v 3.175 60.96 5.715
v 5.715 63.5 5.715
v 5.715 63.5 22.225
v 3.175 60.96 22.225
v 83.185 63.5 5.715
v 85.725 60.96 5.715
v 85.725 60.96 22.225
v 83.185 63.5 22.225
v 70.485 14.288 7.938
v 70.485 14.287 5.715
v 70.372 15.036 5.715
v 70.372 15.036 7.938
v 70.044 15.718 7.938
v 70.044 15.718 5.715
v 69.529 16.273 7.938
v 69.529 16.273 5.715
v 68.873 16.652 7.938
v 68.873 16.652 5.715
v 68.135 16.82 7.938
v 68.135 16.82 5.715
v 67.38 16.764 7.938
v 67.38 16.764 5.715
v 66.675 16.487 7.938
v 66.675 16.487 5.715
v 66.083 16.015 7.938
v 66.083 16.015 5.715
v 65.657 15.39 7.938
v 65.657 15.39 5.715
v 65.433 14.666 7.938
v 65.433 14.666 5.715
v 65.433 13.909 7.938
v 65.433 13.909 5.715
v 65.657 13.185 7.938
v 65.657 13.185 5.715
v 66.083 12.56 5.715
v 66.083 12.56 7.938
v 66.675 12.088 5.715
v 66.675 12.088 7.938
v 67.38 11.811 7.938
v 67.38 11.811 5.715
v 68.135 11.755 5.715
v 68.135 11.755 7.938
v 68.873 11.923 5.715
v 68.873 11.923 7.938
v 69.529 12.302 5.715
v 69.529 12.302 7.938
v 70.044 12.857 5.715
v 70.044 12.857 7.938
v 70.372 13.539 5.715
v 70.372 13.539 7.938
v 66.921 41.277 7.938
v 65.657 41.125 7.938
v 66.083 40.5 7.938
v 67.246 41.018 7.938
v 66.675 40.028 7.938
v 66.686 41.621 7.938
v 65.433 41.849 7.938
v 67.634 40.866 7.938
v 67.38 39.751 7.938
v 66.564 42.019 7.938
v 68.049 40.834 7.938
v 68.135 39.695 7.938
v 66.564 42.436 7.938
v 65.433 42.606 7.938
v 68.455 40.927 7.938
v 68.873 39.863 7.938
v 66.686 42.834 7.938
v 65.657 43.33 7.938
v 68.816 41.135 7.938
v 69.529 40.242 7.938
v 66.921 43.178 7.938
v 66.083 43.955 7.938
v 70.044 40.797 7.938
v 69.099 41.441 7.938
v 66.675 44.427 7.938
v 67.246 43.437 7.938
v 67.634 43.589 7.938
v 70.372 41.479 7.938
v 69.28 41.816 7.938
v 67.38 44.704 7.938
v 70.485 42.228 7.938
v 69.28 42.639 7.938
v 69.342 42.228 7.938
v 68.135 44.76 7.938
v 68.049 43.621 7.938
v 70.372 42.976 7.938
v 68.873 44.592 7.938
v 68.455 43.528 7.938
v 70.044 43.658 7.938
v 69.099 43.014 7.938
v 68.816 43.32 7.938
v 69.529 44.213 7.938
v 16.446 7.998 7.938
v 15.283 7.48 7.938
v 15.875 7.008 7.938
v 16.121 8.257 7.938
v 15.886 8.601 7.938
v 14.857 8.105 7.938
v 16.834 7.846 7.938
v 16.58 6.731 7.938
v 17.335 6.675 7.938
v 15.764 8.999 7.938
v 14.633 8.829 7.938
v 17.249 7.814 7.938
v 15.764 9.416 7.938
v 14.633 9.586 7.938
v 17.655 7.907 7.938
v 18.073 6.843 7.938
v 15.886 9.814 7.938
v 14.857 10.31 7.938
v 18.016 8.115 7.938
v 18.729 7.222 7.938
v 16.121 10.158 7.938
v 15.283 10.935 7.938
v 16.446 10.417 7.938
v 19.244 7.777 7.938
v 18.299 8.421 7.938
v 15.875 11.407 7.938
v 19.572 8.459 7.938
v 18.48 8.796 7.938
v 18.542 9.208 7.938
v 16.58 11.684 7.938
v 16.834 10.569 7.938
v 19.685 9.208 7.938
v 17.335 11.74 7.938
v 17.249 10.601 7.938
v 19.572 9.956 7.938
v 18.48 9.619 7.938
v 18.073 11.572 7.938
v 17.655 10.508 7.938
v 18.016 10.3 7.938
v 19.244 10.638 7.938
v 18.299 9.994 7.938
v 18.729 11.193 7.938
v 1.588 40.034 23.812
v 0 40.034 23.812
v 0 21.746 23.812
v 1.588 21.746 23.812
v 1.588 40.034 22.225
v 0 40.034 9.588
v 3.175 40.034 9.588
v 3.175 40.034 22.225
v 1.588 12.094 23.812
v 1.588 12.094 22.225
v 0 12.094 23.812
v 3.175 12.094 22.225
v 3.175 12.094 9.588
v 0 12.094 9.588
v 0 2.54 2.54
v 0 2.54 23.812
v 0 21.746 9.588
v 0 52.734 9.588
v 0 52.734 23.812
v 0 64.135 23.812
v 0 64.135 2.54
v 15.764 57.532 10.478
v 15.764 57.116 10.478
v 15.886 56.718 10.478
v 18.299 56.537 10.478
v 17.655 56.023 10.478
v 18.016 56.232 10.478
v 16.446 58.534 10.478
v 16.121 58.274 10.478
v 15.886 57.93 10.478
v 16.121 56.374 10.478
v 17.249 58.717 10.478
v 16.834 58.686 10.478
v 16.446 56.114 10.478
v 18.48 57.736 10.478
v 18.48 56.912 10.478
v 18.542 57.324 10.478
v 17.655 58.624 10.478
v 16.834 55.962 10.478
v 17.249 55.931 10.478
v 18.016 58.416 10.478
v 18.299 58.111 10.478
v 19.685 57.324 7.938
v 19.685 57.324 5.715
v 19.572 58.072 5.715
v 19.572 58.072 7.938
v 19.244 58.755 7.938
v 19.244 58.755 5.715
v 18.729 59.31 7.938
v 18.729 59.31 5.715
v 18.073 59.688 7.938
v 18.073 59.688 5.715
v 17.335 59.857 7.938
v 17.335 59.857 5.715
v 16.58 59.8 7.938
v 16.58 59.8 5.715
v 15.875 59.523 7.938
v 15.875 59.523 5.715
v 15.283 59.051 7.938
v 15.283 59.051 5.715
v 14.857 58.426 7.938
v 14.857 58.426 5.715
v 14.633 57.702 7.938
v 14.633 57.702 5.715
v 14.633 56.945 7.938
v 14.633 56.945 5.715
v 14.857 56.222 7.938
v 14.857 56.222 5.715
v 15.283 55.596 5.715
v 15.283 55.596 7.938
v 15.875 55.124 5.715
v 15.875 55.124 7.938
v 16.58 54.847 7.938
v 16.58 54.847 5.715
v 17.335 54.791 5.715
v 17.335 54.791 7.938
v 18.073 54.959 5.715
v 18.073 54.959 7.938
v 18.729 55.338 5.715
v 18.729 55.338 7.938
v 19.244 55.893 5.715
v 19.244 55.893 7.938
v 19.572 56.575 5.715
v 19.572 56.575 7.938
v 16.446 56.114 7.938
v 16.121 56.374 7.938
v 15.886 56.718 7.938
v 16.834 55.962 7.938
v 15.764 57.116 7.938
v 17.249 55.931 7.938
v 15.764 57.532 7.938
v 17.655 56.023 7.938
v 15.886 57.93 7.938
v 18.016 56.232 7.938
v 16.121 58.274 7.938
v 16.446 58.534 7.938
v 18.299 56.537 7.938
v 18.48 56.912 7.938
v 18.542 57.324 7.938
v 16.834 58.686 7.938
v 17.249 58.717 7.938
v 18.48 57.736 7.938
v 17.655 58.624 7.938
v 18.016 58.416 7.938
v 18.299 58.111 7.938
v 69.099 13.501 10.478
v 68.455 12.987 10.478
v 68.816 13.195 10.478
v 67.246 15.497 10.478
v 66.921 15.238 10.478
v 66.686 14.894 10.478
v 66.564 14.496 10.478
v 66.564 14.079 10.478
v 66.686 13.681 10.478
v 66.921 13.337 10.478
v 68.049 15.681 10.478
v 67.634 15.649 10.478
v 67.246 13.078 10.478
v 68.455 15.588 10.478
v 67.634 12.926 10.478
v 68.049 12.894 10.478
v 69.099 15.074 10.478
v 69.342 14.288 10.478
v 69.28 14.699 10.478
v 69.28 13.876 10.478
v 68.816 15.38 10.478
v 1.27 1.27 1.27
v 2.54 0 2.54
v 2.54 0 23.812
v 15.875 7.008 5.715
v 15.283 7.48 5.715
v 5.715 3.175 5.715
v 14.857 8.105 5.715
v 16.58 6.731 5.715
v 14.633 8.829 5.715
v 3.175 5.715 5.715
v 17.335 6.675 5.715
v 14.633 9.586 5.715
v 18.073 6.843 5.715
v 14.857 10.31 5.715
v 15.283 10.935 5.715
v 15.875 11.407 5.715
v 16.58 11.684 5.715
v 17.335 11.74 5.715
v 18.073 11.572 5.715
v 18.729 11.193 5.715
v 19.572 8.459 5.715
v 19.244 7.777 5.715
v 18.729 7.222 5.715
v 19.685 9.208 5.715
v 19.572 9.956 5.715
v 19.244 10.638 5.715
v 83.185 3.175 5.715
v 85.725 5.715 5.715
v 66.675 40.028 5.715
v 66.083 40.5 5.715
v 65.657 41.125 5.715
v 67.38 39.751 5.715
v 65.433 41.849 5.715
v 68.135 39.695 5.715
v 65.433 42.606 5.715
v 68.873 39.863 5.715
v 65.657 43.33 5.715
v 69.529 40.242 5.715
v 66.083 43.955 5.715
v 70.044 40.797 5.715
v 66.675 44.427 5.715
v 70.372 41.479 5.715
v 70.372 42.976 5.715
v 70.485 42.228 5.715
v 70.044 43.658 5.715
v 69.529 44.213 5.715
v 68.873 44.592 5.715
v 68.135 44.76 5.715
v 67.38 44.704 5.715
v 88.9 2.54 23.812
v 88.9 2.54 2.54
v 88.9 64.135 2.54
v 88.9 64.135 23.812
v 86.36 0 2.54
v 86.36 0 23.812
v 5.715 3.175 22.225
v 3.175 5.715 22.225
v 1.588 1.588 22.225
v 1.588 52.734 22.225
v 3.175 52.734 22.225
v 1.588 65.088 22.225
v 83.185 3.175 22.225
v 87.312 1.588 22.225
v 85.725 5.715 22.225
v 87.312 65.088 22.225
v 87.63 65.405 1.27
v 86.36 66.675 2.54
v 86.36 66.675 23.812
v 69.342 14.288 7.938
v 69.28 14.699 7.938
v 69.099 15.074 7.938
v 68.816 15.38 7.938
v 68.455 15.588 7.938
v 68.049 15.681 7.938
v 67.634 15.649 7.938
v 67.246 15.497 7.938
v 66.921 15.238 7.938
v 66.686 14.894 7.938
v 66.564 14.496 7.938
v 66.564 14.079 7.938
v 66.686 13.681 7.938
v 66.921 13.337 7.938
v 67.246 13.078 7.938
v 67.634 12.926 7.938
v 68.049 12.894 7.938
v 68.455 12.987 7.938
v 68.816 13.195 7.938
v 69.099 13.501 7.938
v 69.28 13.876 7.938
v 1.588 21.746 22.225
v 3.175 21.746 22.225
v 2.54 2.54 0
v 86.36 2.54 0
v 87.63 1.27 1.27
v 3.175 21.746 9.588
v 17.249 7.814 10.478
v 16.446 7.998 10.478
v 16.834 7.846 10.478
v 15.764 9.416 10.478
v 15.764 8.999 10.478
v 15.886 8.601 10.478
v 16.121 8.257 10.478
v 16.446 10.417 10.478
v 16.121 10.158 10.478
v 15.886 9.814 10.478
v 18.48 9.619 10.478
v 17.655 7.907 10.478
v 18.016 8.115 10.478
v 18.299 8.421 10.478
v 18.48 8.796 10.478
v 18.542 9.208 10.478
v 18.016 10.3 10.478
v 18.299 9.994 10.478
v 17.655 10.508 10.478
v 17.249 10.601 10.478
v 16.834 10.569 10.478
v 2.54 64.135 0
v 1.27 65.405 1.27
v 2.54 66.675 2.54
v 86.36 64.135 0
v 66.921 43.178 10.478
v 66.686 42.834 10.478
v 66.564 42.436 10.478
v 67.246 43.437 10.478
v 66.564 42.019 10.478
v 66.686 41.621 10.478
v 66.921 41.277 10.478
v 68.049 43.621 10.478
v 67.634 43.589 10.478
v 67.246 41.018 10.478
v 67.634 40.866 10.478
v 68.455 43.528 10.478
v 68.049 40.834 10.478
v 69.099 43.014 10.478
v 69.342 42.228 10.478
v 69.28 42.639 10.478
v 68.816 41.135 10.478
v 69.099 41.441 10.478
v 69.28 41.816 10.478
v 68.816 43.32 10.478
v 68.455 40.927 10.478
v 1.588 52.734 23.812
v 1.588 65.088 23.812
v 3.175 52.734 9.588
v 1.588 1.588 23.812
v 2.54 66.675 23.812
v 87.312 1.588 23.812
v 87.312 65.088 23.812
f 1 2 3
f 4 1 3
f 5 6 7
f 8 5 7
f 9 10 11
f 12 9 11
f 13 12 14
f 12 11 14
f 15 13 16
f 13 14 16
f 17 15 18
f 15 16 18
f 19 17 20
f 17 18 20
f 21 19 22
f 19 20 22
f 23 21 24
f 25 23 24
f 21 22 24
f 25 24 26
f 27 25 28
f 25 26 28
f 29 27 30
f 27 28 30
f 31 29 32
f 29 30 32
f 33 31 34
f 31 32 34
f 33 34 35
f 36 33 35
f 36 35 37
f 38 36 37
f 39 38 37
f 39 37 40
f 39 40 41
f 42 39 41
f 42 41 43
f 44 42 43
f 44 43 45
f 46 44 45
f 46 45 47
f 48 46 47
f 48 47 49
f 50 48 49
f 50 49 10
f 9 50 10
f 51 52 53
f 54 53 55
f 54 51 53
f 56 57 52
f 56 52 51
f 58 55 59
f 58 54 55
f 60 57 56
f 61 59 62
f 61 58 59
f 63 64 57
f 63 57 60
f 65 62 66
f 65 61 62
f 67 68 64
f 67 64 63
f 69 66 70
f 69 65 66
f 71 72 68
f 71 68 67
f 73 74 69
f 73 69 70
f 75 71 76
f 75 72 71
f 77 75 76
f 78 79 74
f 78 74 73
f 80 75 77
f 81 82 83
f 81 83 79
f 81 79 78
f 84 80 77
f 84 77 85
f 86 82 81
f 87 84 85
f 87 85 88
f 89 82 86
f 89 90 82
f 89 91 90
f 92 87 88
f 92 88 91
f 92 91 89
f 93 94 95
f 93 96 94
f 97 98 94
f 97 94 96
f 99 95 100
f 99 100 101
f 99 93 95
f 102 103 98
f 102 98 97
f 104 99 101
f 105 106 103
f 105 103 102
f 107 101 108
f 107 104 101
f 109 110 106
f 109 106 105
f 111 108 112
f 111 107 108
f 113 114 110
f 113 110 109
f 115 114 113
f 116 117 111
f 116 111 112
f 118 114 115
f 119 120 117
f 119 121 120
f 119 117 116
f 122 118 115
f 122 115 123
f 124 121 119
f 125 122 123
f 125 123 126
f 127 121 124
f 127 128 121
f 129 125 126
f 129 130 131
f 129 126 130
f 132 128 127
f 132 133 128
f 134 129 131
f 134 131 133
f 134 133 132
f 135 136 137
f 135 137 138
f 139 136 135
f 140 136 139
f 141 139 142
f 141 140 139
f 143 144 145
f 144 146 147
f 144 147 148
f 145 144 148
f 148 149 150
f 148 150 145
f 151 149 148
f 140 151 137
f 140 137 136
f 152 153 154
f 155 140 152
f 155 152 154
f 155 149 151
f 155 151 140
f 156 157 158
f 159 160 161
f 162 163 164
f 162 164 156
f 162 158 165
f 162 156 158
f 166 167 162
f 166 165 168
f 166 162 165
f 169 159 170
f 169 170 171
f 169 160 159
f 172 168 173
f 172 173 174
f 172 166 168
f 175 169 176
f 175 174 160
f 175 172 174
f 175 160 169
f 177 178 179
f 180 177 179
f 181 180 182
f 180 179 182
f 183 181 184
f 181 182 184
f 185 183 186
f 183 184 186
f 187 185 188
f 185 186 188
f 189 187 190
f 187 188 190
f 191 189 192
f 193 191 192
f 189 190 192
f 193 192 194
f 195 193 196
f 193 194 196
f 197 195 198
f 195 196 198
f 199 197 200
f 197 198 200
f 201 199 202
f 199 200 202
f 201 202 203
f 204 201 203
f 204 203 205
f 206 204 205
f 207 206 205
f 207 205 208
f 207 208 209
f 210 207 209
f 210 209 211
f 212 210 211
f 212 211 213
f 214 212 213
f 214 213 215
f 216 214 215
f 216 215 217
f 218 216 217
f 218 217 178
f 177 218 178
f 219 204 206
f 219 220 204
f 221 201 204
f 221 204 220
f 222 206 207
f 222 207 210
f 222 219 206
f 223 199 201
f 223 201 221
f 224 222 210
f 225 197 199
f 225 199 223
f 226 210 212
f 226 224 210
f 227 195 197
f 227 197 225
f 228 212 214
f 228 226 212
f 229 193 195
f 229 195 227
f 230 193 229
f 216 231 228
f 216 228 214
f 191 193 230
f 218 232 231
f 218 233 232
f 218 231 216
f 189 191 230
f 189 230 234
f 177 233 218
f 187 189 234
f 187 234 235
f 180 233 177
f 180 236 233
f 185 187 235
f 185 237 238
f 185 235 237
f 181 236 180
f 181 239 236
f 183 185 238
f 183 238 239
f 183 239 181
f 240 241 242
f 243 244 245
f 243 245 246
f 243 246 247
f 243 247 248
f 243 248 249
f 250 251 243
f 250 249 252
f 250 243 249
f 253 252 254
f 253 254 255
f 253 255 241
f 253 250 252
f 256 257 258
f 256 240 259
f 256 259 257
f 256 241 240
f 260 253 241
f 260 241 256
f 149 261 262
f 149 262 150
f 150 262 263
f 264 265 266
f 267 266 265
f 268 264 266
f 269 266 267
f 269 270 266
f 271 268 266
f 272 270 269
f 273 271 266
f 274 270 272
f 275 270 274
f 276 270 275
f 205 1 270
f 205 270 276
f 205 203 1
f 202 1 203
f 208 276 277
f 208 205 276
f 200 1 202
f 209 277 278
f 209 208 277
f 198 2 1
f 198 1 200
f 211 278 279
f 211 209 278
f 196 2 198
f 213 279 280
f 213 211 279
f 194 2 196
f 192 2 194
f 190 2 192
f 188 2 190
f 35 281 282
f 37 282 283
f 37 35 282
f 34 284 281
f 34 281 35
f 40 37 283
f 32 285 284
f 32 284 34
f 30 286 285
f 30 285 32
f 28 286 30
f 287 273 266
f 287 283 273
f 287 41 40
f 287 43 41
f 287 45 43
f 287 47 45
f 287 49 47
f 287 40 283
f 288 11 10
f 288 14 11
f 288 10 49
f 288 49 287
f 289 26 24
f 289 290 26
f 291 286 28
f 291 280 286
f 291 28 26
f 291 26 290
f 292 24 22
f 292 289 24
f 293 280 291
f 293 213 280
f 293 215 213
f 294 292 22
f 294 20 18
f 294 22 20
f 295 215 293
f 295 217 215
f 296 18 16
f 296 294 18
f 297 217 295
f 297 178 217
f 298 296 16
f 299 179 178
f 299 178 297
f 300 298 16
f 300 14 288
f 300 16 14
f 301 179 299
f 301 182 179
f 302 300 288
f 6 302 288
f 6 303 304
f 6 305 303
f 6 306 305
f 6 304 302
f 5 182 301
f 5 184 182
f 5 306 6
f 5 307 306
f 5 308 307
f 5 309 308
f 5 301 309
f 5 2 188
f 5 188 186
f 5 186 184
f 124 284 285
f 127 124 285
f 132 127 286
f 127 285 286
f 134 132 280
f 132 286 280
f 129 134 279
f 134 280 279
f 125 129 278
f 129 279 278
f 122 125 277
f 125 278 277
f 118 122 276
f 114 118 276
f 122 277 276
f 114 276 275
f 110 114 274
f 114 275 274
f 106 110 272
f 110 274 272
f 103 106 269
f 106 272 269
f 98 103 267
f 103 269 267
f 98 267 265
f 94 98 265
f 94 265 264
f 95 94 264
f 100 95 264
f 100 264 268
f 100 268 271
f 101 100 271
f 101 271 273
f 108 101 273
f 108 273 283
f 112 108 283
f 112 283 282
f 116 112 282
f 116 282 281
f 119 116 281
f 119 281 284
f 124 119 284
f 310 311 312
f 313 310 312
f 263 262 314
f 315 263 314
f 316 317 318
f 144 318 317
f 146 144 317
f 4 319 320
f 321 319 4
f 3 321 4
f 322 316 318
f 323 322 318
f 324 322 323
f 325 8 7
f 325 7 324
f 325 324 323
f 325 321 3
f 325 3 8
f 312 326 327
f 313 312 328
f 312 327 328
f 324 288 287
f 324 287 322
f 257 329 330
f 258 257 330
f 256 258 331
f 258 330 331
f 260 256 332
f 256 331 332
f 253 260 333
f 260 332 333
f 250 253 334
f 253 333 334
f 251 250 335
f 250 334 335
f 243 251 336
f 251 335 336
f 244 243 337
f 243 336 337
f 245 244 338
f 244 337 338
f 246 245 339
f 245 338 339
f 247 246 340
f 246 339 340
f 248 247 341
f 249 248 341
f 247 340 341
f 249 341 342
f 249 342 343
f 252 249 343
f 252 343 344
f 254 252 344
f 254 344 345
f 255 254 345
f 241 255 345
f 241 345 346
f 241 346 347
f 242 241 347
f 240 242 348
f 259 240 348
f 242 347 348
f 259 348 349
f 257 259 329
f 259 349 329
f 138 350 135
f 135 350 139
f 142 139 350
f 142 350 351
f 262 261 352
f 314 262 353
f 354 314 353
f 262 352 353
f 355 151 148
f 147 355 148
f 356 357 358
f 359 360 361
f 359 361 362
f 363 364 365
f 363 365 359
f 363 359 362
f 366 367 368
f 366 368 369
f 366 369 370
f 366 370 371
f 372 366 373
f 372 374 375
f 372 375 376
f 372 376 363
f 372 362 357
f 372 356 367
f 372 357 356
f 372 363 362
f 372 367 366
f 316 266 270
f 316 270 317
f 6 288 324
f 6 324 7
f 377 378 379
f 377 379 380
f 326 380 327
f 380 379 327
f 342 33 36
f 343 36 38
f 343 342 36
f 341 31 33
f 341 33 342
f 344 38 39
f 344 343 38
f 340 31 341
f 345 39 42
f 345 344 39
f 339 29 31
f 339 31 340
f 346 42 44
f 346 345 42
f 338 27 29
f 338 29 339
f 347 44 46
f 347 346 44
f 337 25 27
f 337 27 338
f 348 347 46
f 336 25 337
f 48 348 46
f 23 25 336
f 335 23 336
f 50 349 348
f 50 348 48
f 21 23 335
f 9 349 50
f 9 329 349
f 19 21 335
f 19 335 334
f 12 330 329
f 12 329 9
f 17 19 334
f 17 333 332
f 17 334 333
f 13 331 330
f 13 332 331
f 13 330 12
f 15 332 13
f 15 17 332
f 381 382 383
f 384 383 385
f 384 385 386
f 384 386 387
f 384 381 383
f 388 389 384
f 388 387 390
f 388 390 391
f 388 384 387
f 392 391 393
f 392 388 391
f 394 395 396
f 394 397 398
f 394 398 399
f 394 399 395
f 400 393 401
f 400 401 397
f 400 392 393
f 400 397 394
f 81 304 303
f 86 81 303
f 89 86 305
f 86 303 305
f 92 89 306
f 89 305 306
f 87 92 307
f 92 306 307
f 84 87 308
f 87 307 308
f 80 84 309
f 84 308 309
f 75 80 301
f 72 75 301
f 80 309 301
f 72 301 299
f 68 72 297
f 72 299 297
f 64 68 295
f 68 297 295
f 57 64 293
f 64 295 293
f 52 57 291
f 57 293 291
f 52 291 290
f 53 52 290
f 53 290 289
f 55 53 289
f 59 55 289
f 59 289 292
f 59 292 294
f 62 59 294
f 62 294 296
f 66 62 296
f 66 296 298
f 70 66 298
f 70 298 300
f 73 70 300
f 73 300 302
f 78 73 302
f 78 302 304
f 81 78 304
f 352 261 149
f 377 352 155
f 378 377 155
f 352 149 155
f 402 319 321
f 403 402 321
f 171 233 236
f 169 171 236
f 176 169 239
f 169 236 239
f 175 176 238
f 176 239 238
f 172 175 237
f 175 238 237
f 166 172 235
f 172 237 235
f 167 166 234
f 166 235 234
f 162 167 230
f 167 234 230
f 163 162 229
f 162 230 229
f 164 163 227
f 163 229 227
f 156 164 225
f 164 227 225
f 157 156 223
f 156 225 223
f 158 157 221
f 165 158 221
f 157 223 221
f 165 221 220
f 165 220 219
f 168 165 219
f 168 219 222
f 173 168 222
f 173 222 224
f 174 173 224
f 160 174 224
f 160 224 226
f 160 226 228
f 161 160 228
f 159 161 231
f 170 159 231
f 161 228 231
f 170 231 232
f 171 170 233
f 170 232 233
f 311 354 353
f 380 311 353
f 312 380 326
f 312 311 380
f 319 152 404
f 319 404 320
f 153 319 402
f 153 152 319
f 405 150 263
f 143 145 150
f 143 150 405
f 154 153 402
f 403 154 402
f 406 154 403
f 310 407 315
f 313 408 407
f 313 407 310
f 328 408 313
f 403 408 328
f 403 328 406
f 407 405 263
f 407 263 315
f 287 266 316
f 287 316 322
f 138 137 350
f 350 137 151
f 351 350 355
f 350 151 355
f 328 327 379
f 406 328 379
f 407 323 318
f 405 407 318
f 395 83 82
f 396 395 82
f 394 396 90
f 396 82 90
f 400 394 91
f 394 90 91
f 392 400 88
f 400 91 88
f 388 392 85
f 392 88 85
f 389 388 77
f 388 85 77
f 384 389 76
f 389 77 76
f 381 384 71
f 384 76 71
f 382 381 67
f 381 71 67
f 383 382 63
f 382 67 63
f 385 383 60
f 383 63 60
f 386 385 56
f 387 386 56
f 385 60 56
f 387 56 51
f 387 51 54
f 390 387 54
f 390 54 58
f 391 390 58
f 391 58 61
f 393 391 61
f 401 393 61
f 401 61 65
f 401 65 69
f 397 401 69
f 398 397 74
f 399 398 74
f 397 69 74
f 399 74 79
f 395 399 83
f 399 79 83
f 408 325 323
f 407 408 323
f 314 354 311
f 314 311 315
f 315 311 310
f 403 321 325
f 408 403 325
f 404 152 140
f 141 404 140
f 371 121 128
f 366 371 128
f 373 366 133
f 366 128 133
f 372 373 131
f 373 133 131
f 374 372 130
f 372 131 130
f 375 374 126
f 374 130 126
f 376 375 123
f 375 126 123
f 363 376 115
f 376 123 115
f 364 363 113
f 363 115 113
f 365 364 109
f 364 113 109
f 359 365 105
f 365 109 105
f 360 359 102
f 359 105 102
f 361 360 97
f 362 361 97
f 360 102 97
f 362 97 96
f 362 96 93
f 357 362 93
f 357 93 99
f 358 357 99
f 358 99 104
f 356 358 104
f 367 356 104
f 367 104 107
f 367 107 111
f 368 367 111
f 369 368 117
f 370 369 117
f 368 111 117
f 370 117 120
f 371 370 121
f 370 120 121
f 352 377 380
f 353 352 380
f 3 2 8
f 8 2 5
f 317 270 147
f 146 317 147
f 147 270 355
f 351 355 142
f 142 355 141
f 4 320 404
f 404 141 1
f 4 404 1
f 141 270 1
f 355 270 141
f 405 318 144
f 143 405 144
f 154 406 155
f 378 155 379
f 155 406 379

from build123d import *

# Parameters (mm, degrees)
F0_W      = 88.9
F0_H      = 66.675
F1_DEPTH  = 3.175
F2_W      = 88.9
F2_H      = 66.675
F2_W_2    = 82.55
F2_H_2    = 60.325
F3_DEPTH  = 19.05
F4_R      = 2.54
F5_DEPTH  = 4.7625
F6_R      = 1.397
F1_FACE_W = 82.55
F1_FACE_H = 60.325
F1_FACE_R = 2.54
F10_DEPTH = 2.54
F7_R      = 1.397
F11_DEPTH = 2.54
F8_R      = 1.397
F12_DEPTH = 2.54
F9_R      = 1.397
F13_DEPTH = 2.54
F14_W     = 9.652
F14_H     = 12.6365
F15_DEPTH = 3.175
F14_W_2   = 12.7
F16_DEPTH = 3.175
F18_DEPTH = 1.5875
F19_W     = 1.5875000006
F19_H     = 18.288
F20_DEPTH = 1.5875
F21_SIZE  = 2.54
F22_SIZE  = 2.54
F23_SIZE  = 2.54


with BuildPart() as f1:
    # F0 (on Top) → F1 (new body)
    with BuildSketch(Plane.XY):
        with Locations((44.45, 33.3375)):
            Rectangle(F0_W, F0_H)
    extrude(amount=F1_DEPTH)

    # F2 (on face) → F3 (join)
    with BuildSketch(Plane.XY.offset(3.175)):
        with Locations((44.45, 33.3375)):
            Rectangle(F2_W, F2_H)
        with Locations((44.45, 33.3375)):
            Rectangle(F2_W_2, F2_H_2, mode=Mode.SUBTRACT)
    extrude(amount=F3_DEPTH)

    # F4 (on face) → F5 (join)
    with BuildSketch(Plane.XY.offset(3.175)):
        with Locations((17.145, 57.3237927139)):
            Circle(F4_R)
        with Locations((17.145, 9.2075)):
            Circle(F4_R)
        with Locations((67.945, 42.2275)):
            Circle(F4_R)
        with Locations((67.945, 14.2875)):
            Circle(F4_R)
    extrude(amount=F5_DEPTH)

    # F6 (on face) + F1_face (on face) → F10 (join)
    with BuildSketch(Plane.XY.offset(7.9375)):
        with Locations((17.145, 57.3237927139)):
            Circle(F6_R)
    with BuildSketch(Plane(origin=(44.45, 33.3375, 3.175), x_dir=(1, 0, 0), z_dir=(0, 0, 1))):
        Rectangle(F1_FACE_W, F1_FACE_H)
        with Locations((-27.305, -24.13)):
            Circle(F1_FACE_R, mode=Mode.SUBTRACT)
        with Locations((23.495, -19.05)):
            Circle(F1_FACE_R, mode=Mode.SUBTRACT)
        with Locations((-27.305, 23.9862927139)):
            Circle(F1_FACE_R, mode=Mode.SUBTRACT)
        with Locations((23.495, 8.89)):
            Circle(F1_FACE_R, mode=Mode.SUBTRACT)
    extrude(amount=F10_DEPTH)

    # F7 (on face) → F11 (join)
    with BuildSketch(Plane.XY.offset(7.9375)):
        with Locations((67.945, 42.2275)):
            Circle(F7_R)
    extrude(amount=F11_DEPTH)

    # F8 (on face) → F12 (join)
    with BuildSketch(Plane.XY.offset(7.9375)):
        with Locations((17.145, 9.2075)):
            Circle(F8_R)
    extrude(amount=F12_DEPTH)

    # F9 (on face) → F13 (join)
    with BuildSketch(Plane.XY.offset(7.9375)):
        with Locations((67.945, 14.2875)):
            Circle(F9_R)
    extrude(amount=F13_DEPTH)

    # F14 (on face) → F15 (cut, through all)
    with BuildSketch(Plane(origin=(0, 0, 0), x_dir=(0, -1, 0), z_dir=(-1, 0, 0))):
        with Locations((-16.9198646352, 15.90675)):
            Rectangle(F14_W, F14_H)
    extrude(amount=-F15_DEPTH, mode=Mode.SUBTRACT)

    # F14 (on face) → F16 (cut, through all)
    with BuildSketch(Plane(origin=(0, 0, 0), x_dir=(0, -1, 0), z_dir=(-1, 0, 0))):
        with Locations((-46.3838646352, 15.90675)):
            Rectangle(F14_W_2, F14_H)
    extrude(amount=-F16_DEPTH, mode=Mode.SUBTRACT)

    # F17 (on face) → F18 (join)
    with BuildSketch(Plane.XY.offset(22.225)):
        Polygon((87.3125, 1.5875), (1.5875, 1.5875), (1.5875, 12.0938646352), (0, 12.0938646352), (0, 0), (88.9, 0), (88.9, 66.675), (0, 66.675), (0, 52.7338646352), (1.5875, 52.7338646352), (1.5875, 65.0875), (87.3125, 65.0875), align=None)
    extrude(amount=F18_DEPTH)

    # F19 (on face) → F20 (join)
    with BuildSketch(Plane.XY.offset(22.225)):
        with Locations((0.7937500003, 30.8898646352)):
            Rectangle(F19_W, F19_H)
    extrude(amount=F20_DEPTH)

    # F21
    f21_edges = [f1.edges().sort_by_distance(p)[0] for p in [
        (88.9, 0, 11.90625),
        (0, 0, 11.90625),
        (88.9, 66.675, 11.90625),
        (0, 66.675, 11.90625),
    ]]
    chamfer(f21_edges, length=F21_SIZE)

    # F22
    f22_edges = [f1.edges().sort_by_distance(p)[0] for p in [
        (3.175, 63.5, 13.97),
        (85.725, 63.5, 13.97),
        (85.725, 3.175, 13.97),
        (3.175, 3.175, 13.97),
    ]]
    chamfer(f22_edges, length=F22_SIZE)

    # F23 (call 1 of 4: OpenCascade refuses the feature's edges together)
    f23_edges = [f1.edges().sort_by_distance(p)[0] for p in [
        (44.45, 0, 0),
    ]]
    chamfer(f23_edges, length=F23_SIZE)

    # F23#2 (call 2 of 4)
    f23_2_edges = [f1.edges().sort_by_distance(p)[0] for p in [
        (88.9, 33.3375, 0),
    ]]
    chamfer(f23_2_edges, length=F23_SIZE)

    # F23#3 (call 3 of 4)
    f23_3_edges = [f1.edges().sort_by_distance(p)[0] for p in [
        (44.45, 66.675, 0),
    ]]
    chamfer(f23_3_edges, length=F23_SIZE)

    # F23#4 (call 4 of 4)
    f23_4_edges = [f1.edges().sort_by_distance(p)[0] for p in [
        (0, 33.3375, 0),
    ]]
    chamfer(f23_4_edges, length=F23_SIZE)


solid = f1.part
